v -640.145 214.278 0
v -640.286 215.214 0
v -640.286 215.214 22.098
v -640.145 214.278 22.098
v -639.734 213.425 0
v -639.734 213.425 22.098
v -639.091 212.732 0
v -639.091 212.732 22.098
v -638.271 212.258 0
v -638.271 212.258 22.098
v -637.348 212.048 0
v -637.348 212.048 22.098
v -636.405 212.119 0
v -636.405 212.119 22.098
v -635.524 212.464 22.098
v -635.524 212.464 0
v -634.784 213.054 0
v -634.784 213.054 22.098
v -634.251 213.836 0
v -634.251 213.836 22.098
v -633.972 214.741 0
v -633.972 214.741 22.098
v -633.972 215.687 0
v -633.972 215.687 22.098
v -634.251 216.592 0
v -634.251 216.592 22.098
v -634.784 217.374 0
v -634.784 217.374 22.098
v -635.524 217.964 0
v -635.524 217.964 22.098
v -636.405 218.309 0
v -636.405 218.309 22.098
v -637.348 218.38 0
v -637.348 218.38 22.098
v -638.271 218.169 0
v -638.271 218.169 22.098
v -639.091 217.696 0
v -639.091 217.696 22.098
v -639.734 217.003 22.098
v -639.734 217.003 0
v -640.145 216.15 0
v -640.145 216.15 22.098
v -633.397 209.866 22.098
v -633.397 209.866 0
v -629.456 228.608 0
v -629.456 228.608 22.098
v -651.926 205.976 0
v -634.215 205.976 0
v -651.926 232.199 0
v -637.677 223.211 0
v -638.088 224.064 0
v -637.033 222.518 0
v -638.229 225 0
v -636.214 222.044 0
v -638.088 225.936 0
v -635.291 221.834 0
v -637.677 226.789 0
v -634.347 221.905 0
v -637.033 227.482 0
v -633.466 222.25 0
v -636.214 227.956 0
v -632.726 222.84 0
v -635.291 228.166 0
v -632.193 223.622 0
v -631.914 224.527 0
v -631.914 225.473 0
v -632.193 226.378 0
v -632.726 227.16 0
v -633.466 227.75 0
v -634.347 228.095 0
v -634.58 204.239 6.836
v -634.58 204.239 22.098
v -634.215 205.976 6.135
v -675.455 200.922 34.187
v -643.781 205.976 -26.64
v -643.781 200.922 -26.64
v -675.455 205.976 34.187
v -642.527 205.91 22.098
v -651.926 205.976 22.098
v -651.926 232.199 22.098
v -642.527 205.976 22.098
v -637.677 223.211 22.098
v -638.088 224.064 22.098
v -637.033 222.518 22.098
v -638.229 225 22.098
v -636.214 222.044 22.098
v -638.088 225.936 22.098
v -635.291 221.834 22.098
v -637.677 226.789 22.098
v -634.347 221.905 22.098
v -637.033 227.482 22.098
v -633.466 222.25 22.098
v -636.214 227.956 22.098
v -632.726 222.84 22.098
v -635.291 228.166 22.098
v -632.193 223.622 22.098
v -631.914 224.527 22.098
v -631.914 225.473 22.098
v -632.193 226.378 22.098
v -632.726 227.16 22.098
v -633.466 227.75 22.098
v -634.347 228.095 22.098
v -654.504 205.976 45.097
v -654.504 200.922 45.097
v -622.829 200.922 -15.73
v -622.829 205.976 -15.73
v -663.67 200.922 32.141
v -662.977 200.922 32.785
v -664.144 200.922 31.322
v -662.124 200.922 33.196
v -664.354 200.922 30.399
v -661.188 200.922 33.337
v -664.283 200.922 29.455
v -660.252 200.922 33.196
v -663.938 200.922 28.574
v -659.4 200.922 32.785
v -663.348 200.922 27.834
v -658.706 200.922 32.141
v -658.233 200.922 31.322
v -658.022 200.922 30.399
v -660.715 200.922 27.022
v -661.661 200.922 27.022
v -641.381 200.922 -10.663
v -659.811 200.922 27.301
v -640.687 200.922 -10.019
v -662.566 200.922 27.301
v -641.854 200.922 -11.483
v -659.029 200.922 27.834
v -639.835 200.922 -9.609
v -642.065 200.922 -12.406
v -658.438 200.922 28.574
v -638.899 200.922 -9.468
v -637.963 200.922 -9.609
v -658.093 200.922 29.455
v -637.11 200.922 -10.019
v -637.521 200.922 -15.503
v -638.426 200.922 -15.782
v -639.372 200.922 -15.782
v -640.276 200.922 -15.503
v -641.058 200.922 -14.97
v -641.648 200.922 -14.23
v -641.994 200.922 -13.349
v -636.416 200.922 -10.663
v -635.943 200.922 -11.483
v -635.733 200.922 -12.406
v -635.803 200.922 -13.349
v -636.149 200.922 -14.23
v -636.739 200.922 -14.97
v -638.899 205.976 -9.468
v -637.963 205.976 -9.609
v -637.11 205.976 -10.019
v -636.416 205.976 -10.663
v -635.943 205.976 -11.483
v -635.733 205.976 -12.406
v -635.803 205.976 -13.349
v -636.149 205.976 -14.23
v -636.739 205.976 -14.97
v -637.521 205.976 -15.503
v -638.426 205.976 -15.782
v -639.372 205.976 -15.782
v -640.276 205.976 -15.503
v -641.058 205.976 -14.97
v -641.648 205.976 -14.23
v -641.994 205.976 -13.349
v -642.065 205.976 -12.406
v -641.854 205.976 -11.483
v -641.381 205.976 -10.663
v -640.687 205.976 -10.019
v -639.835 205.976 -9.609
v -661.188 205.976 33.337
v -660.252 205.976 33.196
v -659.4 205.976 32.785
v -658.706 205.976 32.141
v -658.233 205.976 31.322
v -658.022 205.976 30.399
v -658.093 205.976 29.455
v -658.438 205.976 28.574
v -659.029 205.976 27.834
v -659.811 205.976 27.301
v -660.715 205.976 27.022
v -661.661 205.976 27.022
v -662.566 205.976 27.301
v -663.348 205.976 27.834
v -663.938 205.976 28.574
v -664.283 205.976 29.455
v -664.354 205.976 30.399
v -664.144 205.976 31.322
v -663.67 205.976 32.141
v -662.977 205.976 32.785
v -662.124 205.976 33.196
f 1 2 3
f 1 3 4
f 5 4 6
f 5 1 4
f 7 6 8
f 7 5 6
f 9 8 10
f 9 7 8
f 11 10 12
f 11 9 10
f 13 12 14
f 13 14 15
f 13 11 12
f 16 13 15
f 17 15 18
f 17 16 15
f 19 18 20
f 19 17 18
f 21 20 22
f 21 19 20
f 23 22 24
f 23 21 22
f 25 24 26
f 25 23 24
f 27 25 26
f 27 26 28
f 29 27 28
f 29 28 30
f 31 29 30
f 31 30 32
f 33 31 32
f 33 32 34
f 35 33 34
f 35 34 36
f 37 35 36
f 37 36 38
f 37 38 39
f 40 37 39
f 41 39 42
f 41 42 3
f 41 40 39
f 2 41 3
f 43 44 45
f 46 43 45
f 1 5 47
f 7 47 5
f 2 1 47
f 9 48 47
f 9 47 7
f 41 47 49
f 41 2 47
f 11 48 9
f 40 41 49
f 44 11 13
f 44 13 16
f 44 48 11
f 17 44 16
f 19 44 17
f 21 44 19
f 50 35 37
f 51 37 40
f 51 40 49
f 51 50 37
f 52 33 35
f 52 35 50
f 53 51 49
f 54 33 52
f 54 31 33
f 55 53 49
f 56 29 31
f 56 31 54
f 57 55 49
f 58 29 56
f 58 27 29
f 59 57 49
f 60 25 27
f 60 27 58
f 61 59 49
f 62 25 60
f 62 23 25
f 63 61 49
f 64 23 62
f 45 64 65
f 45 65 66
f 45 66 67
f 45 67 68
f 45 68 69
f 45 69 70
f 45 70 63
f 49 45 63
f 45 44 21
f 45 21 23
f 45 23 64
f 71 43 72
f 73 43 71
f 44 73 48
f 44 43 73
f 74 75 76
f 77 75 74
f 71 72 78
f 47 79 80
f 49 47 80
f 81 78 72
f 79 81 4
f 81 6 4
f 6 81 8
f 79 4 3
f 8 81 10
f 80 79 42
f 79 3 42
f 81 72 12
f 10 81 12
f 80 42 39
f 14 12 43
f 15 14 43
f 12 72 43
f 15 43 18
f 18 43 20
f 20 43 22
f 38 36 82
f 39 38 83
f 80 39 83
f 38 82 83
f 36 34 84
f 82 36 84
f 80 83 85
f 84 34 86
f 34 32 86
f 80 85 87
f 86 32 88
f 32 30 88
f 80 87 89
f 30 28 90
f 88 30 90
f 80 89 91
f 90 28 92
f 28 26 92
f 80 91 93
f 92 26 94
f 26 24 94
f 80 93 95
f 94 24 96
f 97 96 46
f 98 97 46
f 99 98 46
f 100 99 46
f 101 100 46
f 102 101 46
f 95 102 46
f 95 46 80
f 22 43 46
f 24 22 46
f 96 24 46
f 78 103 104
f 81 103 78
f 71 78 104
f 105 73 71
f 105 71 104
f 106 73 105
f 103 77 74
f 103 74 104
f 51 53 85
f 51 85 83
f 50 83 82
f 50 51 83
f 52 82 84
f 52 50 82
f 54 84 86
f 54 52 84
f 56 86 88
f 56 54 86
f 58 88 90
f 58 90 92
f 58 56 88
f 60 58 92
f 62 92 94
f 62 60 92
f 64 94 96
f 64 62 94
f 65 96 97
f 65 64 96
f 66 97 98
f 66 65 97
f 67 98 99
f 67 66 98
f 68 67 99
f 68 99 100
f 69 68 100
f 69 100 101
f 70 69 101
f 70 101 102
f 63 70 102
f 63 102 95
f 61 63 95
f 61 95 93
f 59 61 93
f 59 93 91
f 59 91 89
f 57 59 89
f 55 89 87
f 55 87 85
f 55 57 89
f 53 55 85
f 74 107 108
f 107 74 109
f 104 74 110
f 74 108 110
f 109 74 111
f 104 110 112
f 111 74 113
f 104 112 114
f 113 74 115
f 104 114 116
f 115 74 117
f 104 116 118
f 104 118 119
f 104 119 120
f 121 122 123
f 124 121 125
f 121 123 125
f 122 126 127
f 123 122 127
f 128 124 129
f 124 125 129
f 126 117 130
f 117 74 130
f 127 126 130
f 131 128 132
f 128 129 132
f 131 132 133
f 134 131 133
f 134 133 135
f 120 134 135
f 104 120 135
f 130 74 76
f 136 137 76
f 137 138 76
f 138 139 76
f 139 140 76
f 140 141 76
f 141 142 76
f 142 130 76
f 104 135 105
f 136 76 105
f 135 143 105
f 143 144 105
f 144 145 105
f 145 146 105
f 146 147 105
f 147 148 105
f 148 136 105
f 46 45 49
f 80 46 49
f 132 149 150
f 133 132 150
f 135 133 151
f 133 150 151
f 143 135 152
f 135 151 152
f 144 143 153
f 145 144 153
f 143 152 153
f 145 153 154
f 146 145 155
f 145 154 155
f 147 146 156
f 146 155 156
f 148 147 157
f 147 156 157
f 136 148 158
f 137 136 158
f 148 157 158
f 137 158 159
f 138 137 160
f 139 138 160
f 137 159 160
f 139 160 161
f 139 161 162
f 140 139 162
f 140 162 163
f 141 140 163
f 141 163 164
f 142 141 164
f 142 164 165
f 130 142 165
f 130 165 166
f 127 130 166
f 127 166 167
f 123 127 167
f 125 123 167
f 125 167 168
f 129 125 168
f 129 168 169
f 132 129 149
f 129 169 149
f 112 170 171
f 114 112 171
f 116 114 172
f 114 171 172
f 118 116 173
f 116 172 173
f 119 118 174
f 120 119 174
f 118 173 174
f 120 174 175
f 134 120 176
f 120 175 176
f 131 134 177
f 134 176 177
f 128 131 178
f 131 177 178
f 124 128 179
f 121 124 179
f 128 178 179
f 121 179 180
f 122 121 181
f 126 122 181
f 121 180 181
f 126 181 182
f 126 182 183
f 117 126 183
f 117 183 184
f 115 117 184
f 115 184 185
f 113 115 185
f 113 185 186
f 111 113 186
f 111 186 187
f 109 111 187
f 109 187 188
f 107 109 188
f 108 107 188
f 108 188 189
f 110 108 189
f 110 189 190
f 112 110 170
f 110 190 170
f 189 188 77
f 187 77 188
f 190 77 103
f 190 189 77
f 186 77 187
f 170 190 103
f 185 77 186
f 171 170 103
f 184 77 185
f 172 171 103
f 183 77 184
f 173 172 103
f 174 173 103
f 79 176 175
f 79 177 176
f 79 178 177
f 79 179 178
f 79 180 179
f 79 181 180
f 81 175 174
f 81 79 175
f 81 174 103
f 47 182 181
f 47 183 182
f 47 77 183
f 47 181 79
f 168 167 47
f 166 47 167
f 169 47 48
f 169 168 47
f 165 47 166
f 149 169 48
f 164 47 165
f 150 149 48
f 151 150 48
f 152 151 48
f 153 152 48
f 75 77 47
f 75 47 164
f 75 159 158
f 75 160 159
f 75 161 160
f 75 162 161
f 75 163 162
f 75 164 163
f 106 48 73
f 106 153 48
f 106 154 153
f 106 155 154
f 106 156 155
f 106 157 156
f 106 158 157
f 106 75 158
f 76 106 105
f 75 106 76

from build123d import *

# Parameters (mm, degrees)
SKETCH2_R           = 3.175
BOSS_EXTRUDE1_DEPTH = 22.098
SKETCH3_W           = 8.89
SKETCH3_H           = 22.098
BOSS_EXTRUDE2_DEPTH = 7.62
SKETCH4_R           = 3.175
BOSS_EXTRUDE3_DEPTH = 5.0531014
BOSS_EXTRUDE4_DEPTH = 22.098
CUT_EXTRUDE1_DEPTH  = 126.746
BOSS_EXTRUDE6_REACH = 111.16
SKETCH8_W           = 22.098
SKETCH8_H           = 5.750865106


with BuildPart() as part:
    # Sketch2 → Boss-Extrude1 (new body)
    # profile 1 of 2: a face of its own
    with BuildSketch(Plane.XY):
        with BuildLine():
            Line((-633.396746705, 209.866473294), (-629.456250373, 228.608305414))
            Line((-629.456250373, 228.608305414), (-640.203126947, 230.867851197))
            ThreePointArc((-640.203126947, 230.867851197), (-642.751451447, 226.300988286), (-641.845462116, 221.150320569))
            ThreePointArc((-641.845462116, 221.150320569), (-644.490547106, 217.002439965), (-644.037989982, 212.103809529))
            Line((-644.037989982, 212.103809529), (-633.396746705, 209.866473294))
        make_face()
        with Locations(Location((-637.11116423, 215.213960129, 0), (0, 0, 180))):
            Circle(SKETCH2_R, mode=Mode.SUBTRACT)
        with Locations(Location((-635.053635704, 225, 0), (0, 0, 180))):
            Circle(SKETCH2_R, mode=Mode.SUBTRACT)
    # profile 2 of 2: a face of its own
    with BuildSketch(Plane.XY):
        with BuildLine():
            ThreePointArc((-641.845462116, 221.150320569), (-642.751451447, 226.300988286), (-640.203126947, 230.867851197))
            Line((-640.203126947, 230.867851197), (-646.417262265, 232.174381811))
            Line((-646.417262265, 232.174381811), (-650.357758597, 213.432549691))
            Line((-650.357758597, 213.432549691), (-644.037989982, 212.103809529))
            ThreePointArc((-644.037989982, 212.103809529), (-644.490547106, 217.002439965), (-641.845462116, 221.150320569))
        make_face()
    extrude(amount=BOSS_EXTRUDE1_DEPTH)

    # Sketch3 → Boss-Extrude2 (add)
    with BuildSketch(Plane(origin=(15.442364745, 73.44714554, 0), x_dir=(0.9786039871389689, -0.20575285260650172, 0), z_dir=(-0.20575285260650172, -0.9786039871389689, 0))):
        with Locations((-675.912051568, 11.049)):
            Rectangle(SKETCH3_W, SKETCH3_H)
    extrude(amount=BOSS_EXTRUDE2_DEPTH)

    # Sketch4 → Boss-Extrude3 (add)
    with BuildSketch(Plane(origin=(0, 205.975587309, 0), x_dir=(1, 0, 0), z_dir=(0, 1, 0))):
        Polygon((-643.78094836, 26.639989184), (-675.455245779, -34.187268547), (-654.503634783, -45.097304324), (-622.829337364, 15.729953406), align=None)
        with Locations(Location((-638.898775927, 12.642774556, 0), (0, 0, 270))):
            Circle(SKETCH4_R, mode=Mode.SUBTRACT)
        with Locations(Location((-661.188096333, -30.161591995, 0), (0, 0, 270))):
            Circle(SKETCH4_R, mode=Mode.SUBTRACT)
    extrude(amount=-BOSS_EXTRUDE3_DEPTH)

    # Sketch5 → Boss-Extrude4 (add)
    with BuildSketch(Plane.XY.offset(22.098)):
        Polygon((-651.925595334, 205.975587309), (-651.925595334, 232.199360665), (-646.417262265, 232.174381811), align=None)
    extrude(amount=-BOSS_EXTRUDE4_DEPTH)

    # Sketch6 → Cut-Extrude1 (cut)
    with BuildSketch(Plane(origin=(0, 0, 0), x_dir=(-1, 0, 0), z_dir=(0, 0, -1))):
        Polygon((629.456250373, 228.608305414), (651.925595334, 232.199360665), (646.417262265, 232.174381811), align=None)
    extrude(amount=-CUT_EXTRUDE1_DEPTH, mode=Mode.SUBTRACT)

    # Boss-Extrude6: up to this face of the body (flat: up to its plane)
    boss_extrude6_end = Plane(part.part.faces().sort_by_distance((-642.249597602, 208.78949707, 11.049))[0])
    # Sketch8 → Boss-Extrude6 (add, up to the picked face)
    with BuildSketch(Plane(origin=(-648.83911145, 136.419327755, 0), x_dir=(0, 0, -1), z_dir=(0.9786039871389688, -0.20575285260650203, 0)), mode=Mode.PRIVATE) as boss_extrude6_sk1:
        with Locations((-11.049, 72.177547513)):
            Rectangle(SKETCH8_W, SKETCH8_H)
    boss_extrude6_tool1 = split(extrude(boss_extrude6_sk1.sketch, amount=-BOSS_EXTRUDE6_REACH, mode=Mode.PRIVATE), bisect_by=boss_extrude6_end, keep=Keep.BOTH, mode=Mode.PRIVATE)
    add(boss_extrude6_tool1.solids().sort_by(Axis((-633.988375, 207.052564, 11.049), (-0.9786039871389688, 0.20575285260650203, 0)))[0])


solid = part.part
